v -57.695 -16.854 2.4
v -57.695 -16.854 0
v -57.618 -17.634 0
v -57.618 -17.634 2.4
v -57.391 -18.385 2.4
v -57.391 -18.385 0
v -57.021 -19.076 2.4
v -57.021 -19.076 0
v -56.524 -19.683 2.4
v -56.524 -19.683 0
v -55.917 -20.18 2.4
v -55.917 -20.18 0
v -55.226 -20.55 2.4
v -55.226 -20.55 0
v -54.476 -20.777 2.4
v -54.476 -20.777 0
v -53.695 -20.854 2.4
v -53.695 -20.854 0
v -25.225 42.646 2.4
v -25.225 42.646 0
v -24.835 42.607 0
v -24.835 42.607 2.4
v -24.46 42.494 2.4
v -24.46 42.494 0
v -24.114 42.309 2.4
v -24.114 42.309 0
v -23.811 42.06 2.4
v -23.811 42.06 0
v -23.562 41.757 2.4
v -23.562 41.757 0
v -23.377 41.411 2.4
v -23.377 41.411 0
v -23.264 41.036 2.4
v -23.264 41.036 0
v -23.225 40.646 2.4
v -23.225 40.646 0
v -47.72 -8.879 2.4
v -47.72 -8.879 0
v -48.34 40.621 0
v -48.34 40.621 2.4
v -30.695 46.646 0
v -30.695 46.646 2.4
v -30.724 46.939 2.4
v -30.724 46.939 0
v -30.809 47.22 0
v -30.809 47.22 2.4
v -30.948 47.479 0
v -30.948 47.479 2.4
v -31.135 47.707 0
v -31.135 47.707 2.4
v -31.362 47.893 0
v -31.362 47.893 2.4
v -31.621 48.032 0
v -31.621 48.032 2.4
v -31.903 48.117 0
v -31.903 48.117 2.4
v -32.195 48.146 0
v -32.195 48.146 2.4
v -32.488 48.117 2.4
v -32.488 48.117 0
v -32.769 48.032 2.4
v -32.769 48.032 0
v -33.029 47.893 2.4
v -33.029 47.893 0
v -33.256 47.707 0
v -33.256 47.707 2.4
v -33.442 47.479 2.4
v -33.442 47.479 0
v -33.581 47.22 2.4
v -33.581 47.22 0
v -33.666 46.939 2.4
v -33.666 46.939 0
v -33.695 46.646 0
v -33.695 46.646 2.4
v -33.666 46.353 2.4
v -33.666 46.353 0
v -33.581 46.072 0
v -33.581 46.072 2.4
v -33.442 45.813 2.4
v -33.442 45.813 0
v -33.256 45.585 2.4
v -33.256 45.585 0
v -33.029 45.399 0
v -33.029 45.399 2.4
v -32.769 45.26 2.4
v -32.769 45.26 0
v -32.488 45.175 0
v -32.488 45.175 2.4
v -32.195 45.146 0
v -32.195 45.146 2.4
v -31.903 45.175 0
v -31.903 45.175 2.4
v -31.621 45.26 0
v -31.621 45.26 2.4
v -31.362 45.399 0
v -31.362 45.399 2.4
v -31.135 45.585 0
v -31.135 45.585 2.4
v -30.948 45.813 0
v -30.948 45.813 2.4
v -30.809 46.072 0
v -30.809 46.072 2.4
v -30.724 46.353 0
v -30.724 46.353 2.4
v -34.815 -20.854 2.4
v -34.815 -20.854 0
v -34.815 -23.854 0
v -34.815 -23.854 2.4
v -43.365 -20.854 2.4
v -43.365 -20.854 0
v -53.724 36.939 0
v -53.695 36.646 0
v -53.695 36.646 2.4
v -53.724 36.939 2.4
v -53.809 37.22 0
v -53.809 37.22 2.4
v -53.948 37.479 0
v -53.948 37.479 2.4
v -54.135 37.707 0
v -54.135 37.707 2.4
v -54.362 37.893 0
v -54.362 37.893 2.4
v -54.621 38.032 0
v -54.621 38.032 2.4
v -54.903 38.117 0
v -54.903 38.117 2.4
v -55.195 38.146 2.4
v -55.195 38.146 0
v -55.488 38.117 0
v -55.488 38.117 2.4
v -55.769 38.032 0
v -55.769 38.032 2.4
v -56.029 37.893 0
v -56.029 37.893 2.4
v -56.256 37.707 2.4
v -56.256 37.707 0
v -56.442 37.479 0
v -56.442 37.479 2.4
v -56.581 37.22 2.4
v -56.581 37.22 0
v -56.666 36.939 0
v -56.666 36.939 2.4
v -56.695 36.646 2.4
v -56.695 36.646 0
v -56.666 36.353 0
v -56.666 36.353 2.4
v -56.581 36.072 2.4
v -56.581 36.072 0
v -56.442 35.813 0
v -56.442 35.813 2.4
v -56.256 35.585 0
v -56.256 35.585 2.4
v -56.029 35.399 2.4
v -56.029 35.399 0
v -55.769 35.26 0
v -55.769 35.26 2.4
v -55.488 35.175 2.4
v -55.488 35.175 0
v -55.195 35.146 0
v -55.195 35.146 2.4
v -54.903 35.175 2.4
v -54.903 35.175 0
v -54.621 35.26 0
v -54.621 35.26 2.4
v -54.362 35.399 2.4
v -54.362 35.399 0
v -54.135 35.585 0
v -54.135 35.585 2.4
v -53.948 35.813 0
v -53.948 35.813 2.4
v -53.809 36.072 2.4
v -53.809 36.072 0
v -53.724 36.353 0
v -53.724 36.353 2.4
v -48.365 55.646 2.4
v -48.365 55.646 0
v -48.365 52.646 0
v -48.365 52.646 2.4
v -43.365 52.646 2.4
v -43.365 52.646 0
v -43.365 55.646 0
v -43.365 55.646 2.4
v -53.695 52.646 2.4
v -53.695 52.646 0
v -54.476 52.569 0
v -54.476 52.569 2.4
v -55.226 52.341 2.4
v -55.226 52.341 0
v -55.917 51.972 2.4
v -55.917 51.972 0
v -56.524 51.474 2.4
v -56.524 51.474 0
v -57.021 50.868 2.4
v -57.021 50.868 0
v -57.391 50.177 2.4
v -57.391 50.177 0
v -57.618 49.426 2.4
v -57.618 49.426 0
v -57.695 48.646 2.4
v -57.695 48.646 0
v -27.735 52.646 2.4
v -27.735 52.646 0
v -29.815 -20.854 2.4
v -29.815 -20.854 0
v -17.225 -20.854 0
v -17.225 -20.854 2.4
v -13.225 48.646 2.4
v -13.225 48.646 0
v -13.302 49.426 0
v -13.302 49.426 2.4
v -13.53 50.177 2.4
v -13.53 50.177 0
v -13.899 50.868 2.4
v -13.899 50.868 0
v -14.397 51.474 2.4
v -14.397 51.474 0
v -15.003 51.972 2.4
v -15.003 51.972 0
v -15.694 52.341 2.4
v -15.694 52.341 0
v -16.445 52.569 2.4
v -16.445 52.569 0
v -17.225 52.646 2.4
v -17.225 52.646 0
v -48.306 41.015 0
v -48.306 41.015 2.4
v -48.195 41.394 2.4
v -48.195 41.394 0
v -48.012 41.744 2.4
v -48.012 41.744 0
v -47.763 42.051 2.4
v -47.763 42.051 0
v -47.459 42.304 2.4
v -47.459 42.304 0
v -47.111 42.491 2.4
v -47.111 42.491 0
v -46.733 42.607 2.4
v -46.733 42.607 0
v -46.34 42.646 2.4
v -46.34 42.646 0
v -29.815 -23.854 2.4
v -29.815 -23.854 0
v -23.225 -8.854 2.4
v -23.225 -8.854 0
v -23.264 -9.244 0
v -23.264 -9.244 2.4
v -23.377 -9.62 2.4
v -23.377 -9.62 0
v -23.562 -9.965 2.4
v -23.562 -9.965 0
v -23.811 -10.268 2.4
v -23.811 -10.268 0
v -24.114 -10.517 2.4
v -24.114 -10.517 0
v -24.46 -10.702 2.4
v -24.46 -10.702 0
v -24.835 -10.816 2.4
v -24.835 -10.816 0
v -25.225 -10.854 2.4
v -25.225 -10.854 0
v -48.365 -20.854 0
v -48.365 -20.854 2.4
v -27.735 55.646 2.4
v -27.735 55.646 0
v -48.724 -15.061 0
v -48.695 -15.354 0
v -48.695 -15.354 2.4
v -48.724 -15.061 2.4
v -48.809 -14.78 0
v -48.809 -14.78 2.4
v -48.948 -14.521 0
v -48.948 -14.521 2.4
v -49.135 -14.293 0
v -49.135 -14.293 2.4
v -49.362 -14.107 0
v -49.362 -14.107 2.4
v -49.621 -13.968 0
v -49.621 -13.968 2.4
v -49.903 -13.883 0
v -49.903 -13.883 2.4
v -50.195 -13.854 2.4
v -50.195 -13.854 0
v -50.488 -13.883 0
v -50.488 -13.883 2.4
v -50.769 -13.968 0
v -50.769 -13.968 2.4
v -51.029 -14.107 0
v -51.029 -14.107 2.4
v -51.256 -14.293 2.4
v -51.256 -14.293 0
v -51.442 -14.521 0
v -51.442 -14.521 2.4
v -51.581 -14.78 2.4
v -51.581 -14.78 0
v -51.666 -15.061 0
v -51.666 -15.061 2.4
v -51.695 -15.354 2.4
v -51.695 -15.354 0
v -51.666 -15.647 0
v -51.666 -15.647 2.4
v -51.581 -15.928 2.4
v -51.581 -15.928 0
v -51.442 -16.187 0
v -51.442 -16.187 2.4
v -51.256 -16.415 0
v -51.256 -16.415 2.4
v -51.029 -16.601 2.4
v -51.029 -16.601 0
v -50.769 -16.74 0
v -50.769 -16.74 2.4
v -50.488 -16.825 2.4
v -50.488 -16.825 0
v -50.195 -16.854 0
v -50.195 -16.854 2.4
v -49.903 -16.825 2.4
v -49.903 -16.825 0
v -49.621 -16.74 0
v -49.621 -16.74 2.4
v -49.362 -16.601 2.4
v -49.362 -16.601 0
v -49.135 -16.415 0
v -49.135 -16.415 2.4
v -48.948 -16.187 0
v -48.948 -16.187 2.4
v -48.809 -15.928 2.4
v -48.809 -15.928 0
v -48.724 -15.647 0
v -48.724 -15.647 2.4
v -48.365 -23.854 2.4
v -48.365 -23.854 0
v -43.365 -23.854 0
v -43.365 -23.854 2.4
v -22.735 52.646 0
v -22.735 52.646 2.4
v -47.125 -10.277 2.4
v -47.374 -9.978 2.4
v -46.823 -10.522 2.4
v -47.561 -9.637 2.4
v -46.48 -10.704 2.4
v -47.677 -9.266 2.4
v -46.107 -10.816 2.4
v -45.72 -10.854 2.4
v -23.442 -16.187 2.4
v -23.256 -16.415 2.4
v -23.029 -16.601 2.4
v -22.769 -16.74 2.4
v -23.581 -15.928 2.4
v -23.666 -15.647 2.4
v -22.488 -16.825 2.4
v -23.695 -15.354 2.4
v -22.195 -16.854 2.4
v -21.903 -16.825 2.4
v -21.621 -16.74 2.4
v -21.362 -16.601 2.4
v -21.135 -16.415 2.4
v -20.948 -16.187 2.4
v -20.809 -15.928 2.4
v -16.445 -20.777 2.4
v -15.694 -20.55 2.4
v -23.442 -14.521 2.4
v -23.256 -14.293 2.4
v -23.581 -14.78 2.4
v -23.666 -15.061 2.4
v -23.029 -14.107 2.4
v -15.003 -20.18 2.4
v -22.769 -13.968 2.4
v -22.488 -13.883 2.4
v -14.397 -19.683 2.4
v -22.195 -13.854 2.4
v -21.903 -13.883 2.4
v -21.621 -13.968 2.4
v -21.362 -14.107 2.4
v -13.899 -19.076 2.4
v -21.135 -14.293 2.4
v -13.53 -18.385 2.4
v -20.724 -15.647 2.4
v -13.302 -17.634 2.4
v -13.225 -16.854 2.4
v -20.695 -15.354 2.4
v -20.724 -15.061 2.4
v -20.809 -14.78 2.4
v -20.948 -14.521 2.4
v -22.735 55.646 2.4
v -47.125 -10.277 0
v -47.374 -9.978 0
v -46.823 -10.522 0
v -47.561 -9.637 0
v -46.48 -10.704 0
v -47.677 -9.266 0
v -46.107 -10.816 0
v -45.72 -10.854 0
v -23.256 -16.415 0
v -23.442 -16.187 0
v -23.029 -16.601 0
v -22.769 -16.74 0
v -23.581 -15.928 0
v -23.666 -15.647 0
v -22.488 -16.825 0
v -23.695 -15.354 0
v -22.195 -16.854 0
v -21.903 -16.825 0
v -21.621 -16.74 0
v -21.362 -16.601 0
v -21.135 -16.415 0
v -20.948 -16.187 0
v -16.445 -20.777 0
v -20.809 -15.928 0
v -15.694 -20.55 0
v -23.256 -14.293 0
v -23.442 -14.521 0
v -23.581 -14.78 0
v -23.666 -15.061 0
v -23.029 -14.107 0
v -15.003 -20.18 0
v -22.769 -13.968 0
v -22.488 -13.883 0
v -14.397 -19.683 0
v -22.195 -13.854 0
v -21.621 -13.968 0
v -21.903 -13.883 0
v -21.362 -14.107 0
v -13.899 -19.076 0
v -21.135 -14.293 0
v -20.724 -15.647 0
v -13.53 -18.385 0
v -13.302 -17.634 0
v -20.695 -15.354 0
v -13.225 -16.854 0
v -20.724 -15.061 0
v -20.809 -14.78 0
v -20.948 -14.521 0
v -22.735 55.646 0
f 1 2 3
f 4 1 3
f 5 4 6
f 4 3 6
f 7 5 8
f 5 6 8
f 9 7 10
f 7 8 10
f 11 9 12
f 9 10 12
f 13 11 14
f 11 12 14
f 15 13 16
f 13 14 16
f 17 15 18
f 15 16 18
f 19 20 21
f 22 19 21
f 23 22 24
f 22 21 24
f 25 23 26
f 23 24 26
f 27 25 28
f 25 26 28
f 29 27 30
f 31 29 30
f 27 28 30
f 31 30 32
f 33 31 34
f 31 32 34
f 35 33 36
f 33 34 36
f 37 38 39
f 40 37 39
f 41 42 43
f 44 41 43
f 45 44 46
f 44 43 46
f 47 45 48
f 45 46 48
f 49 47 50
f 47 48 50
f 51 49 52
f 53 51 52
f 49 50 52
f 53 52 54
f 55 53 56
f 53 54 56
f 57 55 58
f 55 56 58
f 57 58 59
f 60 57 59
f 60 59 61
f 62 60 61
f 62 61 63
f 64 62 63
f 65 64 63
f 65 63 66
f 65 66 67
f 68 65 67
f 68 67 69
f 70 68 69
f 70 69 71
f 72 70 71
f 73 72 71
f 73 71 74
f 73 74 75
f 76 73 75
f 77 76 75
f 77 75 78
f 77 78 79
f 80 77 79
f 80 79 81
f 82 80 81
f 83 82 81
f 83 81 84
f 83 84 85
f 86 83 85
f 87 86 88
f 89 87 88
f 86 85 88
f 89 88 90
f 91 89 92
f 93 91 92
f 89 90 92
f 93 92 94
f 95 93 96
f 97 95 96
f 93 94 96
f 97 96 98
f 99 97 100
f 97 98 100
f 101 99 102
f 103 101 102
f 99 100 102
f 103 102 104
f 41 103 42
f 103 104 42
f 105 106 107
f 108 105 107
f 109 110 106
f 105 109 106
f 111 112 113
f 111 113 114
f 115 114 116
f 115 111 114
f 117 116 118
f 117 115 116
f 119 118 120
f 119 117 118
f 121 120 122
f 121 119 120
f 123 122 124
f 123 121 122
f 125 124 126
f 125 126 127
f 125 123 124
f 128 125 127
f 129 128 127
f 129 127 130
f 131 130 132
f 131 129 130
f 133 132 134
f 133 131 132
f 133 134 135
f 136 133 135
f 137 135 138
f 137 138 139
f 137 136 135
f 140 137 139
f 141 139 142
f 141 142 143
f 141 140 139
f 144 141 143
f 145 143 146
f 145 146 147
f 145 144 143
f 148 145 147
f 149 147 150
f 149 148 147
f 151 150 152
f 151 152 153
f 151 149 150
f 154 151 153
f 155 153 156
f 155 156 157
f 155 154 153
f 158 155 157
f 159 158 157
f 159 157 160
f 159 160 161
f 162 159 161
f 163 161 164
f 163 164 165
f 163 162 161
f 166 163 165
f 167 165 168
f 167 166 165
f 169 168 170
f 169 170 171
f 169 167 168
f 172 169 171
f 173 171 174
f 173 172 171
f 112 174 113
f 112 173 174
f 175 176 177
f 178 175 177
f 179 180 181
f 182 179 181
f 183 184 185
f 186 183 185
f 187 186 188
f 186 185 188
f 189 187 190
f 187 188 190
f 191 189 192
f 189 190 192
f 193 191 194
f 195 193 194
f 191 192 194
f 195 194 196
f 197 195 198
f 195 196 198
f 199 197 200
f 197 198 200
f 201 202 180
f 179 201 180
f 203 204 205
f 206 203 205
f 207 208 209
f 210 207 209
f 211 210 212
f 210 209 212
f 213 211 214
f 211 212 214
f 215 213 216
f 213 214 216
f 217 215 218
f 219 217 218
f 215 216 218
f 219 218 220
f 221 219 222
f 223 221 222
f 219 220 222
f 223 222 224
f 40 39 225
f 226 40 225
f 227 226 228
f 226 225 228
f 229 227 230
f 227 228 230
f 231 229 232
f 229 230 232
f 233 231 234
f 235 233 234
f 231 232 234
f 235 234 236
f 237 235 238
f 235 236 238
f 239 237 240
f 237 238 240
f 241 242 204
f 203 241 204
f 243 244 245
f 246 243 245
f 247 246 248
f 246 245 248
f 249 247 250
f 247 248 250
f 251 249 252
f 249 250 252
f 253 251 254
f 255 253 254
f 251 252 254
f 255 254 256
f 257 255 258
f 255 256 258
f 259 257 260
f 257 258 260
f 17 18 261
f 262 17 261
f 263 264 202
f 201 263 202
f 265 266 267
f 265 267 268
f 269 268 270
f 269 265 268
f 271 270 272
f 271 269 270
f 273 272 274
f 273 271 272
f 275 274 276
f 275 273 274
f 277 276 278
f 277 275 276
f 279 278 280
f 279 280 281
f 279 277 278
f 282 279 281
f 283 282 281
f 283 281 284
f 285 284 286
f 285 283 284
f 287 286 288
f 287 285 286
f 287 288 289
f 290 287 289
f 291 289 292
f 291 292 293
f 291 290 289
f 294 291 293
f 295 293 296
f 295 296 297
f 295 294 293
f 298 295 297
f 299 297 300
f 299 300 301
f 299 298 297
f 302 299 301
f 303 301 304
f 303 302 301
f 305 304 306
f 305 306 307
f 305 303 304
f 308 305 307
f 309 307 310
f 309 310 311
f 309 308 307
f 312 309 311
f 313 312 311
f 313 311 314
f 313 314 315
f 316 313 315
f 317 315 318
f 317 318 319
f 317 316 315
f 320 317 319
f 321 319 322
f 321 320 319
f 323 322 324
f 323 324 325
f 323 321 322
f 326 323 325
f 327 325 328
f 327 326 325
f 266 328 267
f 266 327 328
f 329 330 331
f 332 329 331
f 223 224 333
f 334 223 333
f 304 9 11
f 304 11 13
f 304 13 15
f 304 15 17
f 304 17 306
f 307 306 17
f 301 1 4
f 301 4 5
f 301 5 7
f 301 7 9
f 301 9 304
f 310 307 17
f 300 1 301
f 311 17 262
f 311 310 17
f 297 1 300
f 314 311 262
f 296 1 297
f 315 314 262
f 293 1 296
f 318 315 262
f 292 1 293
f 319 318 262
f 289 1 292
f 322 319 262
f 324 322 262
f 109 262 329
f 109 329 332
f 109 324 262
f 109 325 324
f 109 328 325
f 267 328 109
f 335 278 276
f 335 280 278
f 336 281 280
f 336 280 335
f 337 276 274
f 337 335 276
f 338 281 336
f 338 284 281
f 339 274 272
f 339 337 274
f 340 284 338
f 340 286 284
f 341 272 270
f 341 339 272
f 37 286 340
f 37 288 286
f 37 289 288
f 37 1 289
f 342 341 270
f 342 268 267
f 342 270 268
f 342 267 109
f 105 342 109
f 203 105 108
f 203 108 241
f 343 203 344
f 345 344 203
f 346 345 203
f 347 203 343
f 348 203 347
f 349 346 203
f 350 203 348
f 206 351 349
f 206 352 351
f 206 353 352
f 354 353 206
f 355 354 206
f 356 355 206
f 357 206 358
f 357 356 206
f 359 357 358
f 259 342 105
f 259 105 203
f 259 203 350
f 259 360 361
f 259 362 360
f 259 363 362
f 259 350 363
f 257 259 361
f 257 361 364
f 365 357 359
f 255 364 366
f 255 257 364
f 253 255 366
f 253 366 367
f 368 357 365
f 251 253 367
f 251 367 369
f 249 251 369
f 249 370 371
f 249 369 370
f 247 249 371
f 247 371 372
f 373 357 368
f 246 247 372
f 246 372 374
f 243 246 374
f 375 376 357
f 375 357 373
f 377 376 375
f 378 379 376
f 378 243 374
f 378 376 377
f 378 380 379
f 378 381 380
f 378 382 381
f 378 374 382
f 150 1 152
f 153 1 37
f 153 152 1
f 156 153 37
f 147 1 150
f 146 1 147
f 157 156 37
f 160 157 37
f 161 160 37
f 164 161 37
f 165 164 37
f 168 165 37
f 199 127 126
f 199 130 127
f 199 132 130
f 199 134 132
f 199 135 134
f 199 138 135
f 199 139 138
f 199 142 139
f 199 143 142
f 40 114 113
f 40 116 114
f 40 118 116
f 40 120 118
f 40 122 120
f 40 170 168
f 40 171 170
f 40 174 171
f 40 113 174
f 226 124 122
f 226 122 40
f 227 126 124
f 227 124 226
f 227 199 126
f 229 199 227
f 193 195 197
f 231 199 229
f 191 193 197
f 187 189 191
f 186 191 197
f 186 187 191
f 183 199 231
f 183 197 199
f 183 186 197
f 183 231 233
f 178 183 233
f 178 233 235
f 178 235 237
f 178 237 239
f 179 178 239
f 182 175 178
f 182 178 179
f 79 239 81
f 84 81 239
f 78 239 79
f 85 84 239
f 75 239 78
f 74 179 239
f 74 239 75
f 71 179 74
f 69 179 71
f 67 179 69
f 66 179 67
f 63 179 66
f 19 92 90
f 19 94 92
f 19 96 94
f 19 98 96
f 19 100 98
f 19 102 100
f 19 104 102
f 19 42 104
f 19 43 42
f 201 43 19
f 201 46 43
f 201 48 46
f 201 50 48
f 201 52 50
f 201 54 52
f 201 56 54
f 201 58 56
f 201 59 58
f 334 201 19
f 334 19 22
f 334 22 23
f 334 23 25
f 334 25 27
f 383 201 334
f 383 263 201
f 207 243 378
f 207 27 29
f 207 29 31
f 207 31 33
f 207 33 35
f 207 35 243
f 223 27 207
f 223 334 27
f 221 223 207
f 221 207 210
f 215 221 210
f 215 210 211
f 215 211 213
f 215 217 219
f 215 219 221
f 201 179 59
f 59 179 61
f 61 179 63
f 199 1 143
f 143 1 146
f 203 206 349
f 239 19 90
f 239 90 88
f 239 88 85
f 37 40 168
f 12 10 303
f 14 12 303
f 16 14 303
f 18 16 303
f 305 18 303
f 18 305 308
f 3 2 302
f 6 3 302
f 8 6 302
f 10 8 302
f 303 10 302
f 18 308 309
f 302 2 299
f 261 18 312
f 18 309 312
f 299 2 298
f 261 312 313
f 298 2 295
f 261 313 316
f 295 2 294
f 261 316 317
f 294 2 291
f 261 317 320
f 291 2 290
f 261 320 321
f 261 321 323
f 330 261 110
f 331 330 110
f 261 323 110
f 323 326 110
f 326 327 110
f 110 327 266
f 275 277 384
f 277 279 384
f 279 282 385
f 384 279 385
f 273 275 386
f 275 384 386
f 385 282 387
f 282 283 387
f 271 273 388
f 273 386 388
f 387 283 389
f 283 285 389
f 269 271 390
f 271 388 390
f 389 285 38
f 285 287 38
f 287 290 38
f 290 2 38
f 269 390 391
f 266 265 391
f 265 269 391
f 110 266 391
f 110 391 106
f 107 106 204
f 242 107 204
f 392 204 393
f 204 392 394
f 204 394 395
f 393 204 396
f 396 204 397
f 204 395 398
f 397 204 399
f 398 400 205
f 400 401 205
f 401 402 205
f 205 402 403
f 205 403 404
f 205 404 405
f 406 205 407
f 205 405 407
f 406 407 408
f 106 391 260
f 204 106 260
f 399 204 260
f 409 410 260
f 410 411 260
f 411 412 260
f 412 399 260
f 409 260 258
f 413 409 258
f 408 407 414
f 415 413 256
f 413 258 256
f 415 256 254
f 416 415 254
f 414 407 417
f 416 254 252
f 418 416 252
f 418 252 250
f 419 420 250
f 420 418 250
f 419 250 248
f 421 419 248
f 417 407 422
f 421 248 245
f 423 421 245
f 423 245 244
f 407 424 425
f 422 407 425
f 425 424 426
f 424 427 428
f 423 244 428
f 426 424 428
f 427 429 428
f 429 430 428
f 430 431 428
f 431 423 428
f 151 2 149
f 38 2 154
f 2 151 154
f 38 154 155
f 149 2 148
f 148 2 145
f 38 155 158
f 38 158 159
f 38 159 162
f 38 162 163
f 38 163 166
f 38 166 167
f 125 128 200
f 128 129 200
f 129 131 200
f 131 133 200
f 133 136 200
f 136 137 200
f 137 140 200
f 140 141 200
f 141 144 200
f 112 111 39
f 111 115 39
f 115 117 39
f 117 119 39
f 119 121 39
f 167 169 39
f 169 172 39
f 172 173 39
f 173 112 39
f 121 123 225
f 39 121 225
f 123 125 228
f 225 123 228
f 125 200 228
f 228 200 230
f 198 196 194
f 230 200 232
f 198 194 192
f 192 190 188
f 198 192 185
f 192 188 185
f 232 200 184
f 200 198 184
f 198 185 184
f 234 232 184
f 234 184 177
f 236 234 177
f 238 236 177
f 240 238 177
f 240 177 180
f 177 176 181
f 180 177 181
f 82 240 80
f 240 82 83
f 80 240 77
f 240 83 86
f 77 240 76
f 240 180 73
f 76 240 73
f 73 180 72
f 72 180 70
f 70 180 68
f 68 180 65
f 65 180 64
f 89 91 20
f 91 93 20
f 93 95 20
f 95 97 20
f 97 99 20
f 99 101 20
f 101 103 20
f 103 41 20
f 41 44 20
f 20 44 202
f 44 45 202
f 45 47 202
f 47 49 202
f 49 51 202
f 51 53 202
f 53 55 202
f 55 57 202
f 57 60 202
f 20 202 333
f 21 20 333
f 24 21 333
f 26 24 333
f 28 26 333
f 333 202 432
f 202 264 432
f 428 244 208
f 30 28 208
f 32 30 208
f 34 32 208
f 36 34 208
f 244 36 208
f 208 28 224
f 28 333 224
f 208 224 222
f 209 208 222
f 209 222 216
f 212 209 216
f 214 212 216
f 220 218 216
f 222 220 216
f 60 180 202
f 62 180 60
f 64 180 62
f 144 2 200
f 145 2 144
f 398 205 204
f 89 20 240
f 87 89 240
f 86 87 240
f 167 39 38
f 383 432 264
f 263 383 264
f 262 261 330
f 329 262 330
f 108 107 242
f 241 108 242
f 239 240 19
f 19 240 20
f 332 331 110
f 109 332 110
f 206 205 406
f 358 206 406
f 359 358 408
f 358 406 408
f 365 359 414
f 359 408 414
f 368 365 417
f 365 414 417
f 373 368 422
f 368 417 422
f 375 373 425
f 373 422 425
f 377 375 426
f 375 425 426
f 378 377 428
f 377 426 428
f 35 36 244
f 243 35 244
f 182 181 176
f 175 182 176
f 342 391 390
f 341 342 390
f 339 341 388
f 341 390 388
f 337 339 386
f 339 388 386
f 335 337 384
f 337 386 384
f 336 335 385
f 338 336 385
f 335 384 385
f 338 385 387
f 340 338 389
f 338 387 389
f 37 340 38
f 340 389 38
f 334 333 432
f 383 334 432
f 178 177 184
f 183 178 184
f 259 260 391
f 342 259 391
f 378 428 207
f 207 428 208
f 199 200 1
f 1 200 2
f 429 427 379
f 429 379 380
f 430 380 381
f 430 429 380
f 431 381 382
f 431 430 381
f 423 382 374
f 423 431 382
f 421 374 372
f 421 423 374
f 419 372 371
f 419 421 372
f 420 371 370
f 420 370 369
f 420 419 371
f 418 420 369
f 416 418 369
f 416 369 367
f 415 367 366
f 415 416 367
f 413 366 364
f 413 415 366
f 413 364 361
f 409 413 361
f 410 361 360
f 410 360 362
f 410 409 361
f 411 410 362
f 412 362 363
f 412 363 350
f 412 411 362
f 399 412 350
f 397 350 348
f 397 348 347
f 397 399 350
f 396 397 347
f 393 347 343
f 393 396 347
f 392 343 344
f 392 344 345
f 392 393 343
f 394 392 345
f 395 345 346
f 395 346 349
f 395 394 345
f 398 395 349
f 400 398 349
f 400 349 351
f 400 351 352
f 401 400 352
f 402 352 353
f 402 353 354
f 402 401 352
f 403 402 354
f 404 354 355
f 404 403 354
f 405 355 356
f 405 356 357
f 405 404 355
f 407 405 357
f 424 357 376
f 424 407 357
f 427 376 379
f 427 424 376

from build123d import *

# Parameters (mm, degrees)
CROQUIS1_R              = 1.5
SALIENTE_EXTRUIR1_DEPTH = 2.4
CORTAR_EXTRUIR1_REACH   = 82.193
CROQUIS2_R              = 1.5


with BuildPart() as part:
    # Croquis1 → Saliente-Extruir1 (new body)
    with BuildSketch(Plane.XY):
        with BuildLine():
            Line((-27.735211809, 52.645866632), (-43.365211809, 52.645866632))
            Line((-43.365211809, 52.645866632), (-43.365211809, 55.645866632))
            Line((-43.365211809, 55.645866632), (-48.365211809, 55.645866632))
            Line((-48.365211809, 55.645866632), (-48.365211809, 52.645866632))
            Line((-48.365211809, 52.645866632), (-53.695211809, 52.645866632))
            ThreePointArc((-53.695211809, 52.645866632), (-56.523638933, 51.474293757), (-57.695211809, 48.645866632))
            Line((-57.695211809, 48.645866632), (-57.695211809, -16.854133368))
            ThreePointArc((-57.695211809, -16.854133368), (-56.523638933, -19.682560493), (-53.695211809, -20.854133368))
            Line((-53.695211809, -20.854133368), (-48.365211809, -20.854133368))
            Line((-48.365211809, -20.854133368), (-48.365211809, -23.854133368))
            Line((-48.365211809, -23.854133368), (-43.365211809, -23.854133368))
            Line((-43.365211809, -23.854133368), (-43.365211809, -20.854133368))
            Line((-43.365211809, -20.854133368), (-34.815211809, -20.854133368))
            Line((-34.815211809, -20.854133368), (-34.815211809, -23.854133368))
            Line((-34.815211809, -23.854133368), (-29.815211809, -23.854133368))
            Line((-29.815211809, -23.854133368), (-29.815211809, -20.854133368))
            Line((-29.815211809, -20.854133368), (-17.225211809, -20.854133368))
            ThreePointArc((-17.225211809, -20.854133368), (-14.396784684, -19.682560493), (-13.225211809, -16.854133368))
            Line((-13.225211809, -16.854133368), (-13.225211809, 48.645866632))
            ThreePointArc((-13.225211809, 48.645866632), (-14.396784684, 51.474293757), (-17.225211809, 52.645866632))
            Line((-17.225211809, 52.645866632), (-22.735211809, 52.645866632))
            Line((-22.735211809, 52.645866632), (-22.735211809, 55.645866632))
            Line((-22.735211809, 55.645866632), (-27.735211809, 55.645866632))
            Line((-27.735211809, 55.645866632), (-27.735211809, 52.645866632))
        make_face()
        with Locations((-55.195211809, 36.645866632)):
            Circle(CROQUIS1_R, mode=Mode.SUBTRACT)
        with Locations((-50.195211809, -15.354133368)):
            Circle(CROQUIS1_R, mode=Mode.SUBTRACT)
        with Locations((-22.195211809, -15.354133368)):
            Circle(CROQUIS1_R, mode=Mode.SUBTRACT)
        with BuildLine():
            Line((-35.550211809, 42.645866632), (-25.225211809, 42.645866632))
            ThreePointArc((-25.225211809, 42.645866632), (-23.810998246, 42.060080194), (-23.225211809, 40.645866632))
            Line((-23.225211809, 40.645866632), (-23.225211809, -8.854133368))
            ThreePointArc((-23.225211809, -8.854133368), (-23.810998246, -10.26834693), (-25.225211809, -10.854133368))
            Line((-25.225211809, -10.854133368), (-45.720101709, -10.854133368))
            ThreePointArc((-45.720101709, -10.854133368), (-47.125432715, -10.277174044), (-47.719944893, -8.879178133))
            Line((-47.719944893, -8.879178133), (-48.339851435, 40.620821867))
            ThreePointArc((-48.339851435, 40.620821867), (-47.763048927, 42.051197638), (-46.340008251, 42.645866632))
            Line((-46.340008251, 42.645866632), (-35.550211809, 42.645866632))
        make_face(mode=Mode.SUBTRACT)
    extrude(amount=SALIENTE_EXTRUIR1_DEPTH)

    # Croquis2 → Cortar-Extruir1 (cut, up to next)
    with BuildSketch(Plane.XY.offset(2.4), mode=Mode.PRIVATE) as cortar_extruir1_sk1:
        with Locations((-32.195211809, 46.645866632)):
            Circle(CROQUIS2_R)
    cortar_extruir1_tool1 = extrude(cortar_extruir1_sk1.sketch, amount=-CORTAR_EXTRUIR1_REACH, mode=Mode.PRIVATE) & part.part
    add(cortar_extruir1_tool1.solids().sort_by_distance((-32.195212, 46.645867, 2.4))[0], mode=Mode.SUBTRACT)


solid = part.part
